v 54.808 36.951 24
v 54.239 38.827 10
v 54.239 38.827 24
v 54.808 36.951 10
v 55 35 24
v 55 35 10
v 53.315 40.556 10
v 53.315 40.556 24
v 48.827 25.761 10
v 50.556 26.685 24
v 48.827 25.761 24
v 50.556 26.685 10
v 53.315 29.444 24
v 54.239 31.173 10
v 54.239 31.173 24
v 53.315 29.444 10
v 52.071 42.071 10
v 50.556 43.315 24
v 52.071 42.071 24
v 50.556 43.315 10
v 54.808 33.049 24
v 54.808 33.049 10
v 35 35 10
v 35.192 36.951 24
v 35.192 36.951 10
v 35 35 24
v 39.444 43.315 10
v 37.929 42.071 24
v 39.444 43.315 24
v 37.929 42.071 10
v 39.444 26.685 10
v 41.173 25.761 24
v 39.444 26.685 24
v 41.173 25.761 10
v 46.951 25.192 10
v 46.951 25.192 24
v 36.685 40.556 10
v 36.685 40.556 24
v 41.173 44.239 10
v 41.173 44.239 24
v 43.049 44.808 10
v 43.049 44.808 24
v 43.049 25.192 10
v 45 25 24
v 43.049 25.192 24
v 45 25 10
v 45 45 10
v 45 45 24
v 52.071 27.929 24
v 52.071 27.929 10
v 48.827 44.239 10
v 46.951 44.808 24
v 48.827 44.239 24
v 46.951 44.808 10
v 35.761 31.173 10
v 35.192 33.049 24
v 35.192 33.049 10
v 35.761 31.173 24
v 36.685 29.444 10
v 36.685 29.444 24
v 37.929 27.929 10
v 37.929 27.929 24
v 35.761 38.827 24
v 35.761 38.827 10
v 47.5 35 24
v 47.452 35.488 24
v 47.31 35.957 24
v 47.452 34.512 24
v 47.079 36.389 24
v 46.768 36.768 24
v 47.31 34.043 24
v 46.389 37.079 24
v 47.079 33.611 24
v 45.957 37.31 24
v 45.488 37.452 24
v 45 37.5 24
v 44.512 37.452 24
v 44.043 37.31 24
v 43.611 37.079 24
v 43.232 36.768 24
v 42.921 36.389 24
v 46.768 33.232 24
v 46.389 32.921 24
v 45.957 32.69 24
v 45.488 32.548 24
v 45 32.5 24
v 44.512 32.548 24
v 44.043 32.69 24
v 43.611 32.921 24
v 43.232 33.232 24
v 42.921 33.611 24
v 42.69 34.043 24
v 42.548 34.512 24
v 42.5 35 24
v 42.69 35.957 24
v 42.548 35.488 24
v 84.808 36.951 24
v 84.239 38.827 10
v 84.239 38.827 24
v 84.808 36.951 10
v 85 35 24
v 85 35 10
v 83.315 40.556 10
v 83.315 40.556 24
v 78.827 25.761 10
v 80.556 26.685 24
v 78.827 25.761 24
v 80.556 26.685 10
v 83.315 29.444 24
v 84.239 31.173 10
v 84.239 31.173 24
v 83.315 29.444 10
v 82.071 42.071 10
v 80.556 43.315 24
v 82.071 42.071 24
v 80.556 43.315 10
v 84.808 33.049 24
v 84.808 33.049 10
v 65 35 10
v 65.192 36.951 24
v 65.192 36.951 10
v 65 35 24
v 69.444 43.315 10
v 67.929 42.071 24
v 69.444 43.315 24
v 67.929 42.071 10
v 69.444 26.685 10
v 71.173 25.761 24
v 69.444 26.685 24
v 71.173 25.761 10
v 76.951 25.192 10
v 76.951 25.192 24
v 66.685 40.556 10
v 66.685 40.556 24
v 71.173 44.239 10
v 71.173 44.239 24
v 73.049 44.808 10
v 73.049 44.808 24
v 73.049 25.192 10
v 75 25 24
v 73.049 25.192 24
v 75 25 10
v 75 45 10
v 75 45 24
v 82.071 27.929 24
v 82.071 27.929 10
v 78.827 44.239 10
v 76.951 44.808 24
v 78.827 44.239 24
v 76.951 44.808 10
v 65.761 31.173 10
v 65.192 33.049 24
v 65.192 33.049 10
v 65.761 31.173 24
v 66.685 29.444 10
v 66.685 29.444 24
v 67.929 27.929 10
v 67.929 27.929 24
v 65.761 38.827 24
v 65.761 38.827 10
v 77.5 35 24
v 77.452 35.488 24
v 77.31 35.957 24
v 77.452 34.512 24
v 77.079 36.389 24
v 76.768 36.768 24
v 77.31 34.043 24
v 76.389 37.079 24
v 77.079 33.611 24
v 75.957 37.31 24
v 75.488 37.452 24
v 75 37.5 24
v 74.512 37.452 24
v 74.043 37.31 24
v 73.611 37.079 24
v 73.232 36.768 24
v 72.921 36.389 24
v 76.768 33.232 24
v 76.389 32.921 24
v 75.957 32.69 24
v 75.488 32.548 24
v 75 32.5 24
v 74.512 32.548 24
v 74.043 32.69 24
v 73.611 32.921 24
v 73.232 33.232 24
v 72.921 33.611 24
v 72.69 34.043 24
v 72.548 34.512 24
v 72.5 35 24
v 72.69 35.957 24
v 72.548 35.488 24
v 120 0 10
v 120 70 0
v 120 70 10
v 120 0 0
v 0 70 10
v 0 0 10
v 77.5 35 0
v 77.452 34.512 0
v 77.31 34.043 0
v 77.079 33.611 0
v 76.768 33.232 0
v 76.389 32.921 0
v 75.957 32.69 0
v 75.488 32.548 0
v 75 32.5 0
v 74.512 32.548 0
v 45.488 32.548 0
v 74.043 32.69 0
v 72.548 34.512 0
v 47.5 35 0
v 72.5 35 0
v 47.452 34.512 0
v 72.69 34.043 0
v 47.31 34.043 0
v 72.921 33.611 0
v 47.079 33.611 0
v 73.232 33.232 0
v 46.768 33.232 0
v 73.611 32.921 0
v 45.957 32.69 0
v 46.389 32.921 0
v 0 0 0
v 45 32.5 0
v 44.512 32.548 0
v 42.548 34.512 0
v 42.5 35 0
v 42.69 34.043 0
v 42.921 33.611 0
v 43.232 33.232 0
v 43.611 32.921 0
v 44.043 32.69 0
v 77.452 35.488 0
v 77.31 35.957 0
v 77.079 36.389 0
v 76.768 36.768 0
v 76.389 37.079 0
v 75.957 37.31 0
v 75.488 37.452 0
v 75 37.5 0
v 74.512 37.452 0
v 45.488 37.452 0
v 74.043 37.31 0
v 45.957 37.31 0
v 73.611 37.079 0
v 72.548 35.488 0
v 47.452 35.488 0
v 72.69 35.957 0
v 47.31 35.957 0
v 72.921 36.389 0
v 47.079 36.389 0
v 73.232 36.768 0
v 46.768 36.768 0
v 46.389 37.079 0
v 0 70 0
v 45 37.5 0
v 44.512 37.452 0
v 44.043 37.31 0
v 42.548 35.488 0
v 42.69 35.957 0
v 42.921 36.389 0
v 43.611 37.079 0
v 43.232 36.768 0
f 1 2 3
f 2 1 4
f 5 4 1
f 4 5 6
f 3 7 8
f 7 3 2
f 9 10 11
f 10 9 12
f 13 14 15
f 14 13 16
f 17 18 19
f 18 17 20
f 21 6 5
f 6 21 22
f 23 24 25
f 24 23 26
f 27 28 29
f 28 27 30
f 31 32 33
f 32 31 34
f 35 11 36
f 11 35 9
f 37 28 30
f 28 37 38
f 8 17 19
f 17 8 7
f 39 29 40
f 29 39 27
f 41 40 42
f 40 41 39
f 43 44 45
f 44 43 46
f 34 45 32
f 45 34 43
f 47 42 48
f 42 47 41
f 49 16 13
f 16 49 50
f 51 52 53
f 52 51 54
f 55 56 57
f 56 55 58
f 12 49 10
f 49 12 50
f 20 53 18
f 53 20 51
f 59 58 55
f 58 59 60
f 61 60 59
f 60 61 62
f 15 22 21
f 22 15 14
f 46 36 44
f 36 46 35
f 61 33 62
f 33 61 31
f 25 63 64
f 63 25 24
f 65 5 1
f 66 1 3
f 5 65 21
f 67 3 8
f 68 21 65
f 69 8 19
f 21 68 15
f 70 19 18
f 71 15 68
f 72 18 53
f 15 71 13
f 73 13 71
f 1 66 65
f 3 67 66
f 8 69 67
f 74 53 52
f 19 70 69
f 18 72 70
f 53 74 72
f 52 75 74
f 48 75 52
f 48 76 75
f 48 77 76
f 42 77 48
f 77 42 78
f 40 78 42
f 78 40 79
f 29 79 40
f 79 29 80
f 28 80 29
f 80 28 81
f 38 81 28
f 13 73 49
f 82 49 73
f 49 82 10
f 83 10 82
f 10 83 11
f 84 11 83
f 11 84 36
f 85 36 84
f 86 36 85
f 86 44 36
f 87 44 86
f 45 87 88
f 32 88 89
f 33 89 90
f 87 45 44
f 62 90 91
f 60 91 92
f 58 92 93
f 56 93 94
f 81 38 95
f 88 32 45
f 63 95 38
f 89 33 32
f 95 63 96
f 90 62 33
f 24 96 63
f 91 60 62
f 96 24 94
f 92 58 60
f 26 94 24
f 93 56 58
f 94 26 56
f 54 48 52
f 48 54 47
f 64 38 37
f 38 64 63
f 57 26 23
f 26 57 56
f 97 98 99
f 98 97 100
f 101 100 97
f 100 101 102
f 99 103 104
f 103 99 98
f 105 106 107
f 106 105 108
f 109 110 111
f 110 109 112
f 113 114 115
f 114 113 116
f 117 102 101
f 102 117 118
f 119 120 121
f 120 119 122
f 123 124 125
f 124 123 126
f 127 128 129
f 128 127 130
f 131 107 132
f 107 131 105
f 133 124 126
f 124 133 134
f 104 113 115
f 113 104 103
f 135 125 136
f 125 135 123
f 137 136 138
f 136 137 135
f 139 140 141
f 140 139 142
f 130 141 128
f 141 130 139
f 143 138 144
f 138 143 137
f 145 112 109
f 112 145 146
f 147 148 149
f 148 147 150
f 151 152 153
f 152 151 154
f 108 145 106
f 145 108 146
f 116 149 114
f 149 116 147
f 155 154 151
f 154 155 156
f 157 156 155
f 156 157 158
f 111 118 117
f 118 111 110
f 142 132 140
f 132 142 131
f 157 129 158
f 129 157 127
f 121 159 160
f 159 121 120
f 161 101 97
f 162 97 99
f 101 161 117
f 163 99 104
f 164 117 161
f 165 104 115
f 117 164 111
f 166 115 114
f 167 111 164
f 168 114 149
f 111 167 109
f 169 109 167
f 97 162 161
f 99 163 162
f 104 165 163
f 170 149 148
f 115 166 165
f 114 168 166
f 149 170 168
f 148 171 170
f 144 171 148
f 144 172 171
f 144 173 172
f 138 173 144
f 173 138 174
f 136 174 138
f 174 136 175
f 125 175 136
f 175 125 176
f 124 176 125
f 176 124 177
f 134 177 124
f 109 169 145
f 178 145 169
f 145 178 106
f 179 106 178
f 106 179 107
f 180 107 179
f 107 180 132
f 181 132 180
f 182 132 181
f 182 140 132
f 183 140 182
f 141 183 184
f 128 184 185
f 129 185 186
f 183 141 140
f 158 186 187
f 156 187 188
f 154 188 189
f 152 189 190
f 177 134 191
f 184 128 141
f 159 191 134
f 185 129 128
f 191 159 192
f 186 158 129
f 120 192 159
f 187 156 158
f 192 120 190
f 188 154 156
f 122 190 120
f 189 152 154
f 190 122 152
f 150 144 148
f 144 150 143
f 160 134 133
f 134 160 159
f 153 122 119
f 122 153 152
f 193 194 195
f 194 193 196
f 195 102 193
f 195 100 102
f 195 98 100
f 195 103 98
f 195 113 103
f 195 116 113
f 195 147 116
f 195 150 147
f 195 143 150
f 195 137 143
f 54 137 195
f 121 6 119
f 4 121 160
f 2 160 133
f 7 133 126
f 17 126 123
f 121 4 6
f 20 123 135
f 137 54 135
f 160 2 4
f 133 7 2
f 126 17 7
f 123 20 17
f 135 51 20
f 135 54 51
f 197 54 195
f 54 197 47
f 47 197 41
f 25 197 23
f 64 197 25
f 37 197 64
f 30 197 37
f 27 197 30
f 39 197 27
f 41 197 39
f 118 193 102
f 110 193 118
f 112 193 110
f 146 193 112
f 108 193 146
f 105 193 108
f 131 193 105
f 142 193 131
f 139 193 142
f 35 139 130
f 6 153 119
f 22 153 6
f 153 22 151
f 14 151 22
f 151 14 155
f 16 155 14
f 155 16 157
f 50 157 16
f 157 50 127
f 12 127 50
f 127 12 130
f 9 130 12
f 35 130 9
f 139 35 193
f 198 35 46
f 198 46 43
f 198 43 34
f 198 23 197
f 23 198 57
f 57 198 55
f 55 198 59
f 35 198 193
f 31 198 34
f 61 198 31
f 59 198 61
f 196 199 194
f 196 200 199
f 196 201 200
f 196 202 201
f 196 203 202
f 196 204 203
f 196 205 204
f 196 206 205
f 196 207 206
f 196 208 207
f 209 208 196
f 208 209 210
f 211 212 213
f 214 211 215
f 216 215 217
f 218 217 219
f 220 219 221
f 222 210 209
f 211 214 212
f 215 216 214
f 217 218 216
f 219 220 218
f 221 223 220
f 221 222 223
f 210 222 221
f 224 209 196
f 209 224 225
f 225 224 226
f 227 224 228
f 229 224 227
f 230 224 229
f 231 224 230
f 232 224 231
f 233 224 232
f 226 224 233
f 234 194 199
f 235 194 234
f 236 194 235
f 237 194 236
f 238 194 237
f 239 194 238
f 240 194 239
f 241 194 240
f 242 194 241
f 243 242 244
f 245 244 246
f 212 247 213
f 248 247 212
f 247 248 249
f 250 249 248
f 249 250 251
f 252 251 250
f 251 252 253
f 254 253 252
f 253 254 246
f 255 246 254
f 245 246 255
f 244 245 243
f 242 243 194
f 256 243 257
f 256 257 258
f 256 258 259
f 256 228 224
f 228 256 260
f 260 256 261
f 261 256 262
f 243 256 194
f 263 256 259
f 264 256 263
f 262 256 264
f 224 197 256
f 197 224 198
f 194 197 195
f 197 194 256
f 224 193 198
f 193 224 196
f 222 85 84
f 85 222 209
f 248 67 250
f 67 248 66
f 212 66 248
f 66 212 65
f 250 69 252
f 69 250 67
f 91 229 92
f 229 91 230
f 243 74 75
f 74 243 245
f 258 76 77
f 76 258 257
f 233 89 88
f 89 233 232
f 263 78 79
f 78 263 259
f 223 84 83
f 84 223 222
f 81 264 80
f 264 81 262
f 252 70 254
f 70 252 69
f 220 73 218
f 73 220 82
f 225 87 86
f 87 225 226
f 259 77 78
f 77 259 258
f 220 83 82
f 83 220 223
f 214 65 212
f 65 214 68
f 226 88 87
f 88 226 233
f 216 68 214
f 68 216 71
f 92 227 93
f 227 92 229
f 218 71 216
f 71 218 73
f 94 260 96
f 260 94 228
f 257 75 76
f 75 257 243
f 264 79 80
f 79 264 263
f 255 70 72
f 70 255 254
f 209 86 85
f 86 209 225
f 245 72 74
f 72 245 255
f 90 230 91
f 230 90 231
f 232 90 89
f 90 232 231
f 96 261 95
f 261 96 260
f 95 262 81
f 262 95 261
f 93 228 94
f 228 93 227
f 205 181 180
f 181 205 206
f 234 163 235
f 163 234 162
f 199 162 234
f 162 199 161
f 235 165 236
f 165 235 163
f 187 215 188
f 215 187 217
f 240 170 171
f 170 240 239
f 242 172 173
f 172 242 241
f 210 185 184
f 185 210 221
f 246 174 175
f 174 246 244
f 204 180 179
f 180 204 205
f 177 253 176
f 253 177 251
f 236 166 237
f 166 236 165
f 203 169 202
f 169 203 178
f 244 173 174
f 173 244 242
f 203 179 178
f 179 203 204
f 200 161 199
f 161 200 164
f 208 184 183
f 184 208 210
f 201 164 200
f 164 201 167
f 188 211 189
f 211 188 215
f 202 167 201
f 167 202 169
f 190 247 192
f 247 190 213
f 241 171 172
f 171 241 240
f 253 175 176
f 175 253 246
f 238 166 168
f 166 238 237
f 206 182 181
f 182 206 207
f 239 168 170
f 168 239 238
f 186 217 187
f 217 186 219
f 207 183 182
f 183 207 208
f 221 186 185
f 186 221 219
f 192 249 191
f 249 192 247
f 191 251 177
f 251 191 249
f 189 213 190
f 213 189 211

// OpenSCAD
$fn = 32;

// ----------------------------------------------------------------------
// Drill jig: two_boss jig
// ----------------------------------------------------------------------

// --- parameters (mm) ---
plate_l = 120;            // plate length, X
plate_w = 70;             // plate width, Y
plate_t = 10;             // plate thickness
boss_d = 20;              // guide boss diameter
boss_h = 15;              // boss height above the plate
guide_d = 5;              // guide hole diameter
boss_pitch = 30;          // boss pitch

n_boss = 2;  // guide bosses
boss_x0 = (plate_l - (n_boss - 1) * boss_pitch) / 2;  // first boss X
boss_top = plate_t - 1 + boss_h;  // boss crown height
total_h = boss_top;  // overall height

difference() {
  union() {
  cube([plate_l, plate_w, plate_t]);
  for (i = [0 : n_boss - 1])
    translate([boss_x0 + i * boss_pitch, plate_w / 2, plate_t - 1])
      cylinder(h = boss_h, d = boss_d);
  }
  for (i = [0 : n_boss - 1])
    translate([boss_x0 + i * boss_pitch, plate_w / 2, -1])
      cylinder(h = plate_t + boss_h, d = guide_d);
}
